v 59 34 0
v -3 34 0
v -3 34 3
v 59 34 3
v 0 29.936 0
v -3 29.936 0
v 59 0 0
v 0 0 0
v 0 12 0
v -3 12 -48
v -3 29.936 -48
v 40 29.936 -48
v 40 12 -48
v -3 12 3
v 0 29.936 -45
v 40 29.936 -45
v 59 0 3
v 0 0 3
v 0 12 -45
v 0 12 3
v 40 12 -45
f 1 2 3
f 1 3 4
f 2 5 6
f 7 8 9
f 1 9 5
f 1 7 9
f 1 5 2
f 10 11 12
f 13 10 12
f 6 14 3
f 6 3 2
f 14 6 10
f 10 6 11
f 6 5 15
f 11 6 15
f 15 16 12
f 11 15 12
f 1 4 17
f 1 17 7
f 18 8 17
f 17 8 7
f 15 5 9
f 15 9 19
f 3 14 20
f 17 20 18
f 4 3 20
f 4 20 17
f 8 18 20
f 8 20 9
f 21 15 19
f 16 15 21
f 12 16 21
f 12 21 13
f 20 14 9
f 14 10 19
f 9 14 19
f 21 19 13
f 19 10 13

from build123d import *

# Parameters (mm, degrees)
SKETCH_1_W          = 59
SKETCH_1_H          = 3
EXTRUDE_1_DEPTH     = 34
SKETCH_2_W          = 3
SKETCH_2_H          = 48
EXTRUDE_2_DEPTH     = 22
SKETCH_3_W          = 43
SKETCH_3_H          = 3
EXTRUDE_3_DEPTH     = 22
SKETCH_4_W          = 48
SKETCH_4_H          = 4.064402022
CUT_EXTRUDE_1_DEPTH = 89


with BuildPart() as part:
    # 草图1 → 凸台-拉伸1 (new body)
    with BuildSketch(Plane(origin=(0, 0, 0), x_dir=(1, 0, 0), z_dir=(0, 1, 0))):
        with Locations((29.5, -1.5)):
            Rectangle(SKETCH_1_W, SKETCH_1_H)
    extrude(amount=EXTRUDE_1_DEPTH)

    # 草图2 → 凸台-拉伸2 (add)
    with BuildSketch(Plane(origin=(0, 34, 0), x_dir=(1, 0, 0), z_dir=(0, 1, 0))):
        with Locations((-1.5, 21)):
            Rectangle(SKETCH_2_W, SKETCH_2_H)
    extrude(amount=-EXTRUDE_2_DEPTH)

    # 草图3 → 凸台-拉伸3 (add)
    with BuildSketch(Plane(origin=(0, 34, 0), x_dir=(1, 0, 0), z_dir=(0, 1, 0))):
        with Locations((18.5, 46.5)):
            Rectangle(SKETCH_3_W, SKETCH_3_H)
    extrude(amount=-EXTRUDE_3_DEPTH)

    # 草图4 → 切除-拉伸1 (cut)
    with BuildSketch(Plane(origin=(40, 0, 0), x_dir=(0, 0, -1), z_dir=(1, 0, 0))):
        with Locations((24, 31.967798989)):
            Rectangle(SKETCH_4_W, SKETCH_4_H)
    extrude(amount=-CUT_EXTRUDE_1_DEPTH, mode=Mode.SUBTRACT)


solid = part.part
